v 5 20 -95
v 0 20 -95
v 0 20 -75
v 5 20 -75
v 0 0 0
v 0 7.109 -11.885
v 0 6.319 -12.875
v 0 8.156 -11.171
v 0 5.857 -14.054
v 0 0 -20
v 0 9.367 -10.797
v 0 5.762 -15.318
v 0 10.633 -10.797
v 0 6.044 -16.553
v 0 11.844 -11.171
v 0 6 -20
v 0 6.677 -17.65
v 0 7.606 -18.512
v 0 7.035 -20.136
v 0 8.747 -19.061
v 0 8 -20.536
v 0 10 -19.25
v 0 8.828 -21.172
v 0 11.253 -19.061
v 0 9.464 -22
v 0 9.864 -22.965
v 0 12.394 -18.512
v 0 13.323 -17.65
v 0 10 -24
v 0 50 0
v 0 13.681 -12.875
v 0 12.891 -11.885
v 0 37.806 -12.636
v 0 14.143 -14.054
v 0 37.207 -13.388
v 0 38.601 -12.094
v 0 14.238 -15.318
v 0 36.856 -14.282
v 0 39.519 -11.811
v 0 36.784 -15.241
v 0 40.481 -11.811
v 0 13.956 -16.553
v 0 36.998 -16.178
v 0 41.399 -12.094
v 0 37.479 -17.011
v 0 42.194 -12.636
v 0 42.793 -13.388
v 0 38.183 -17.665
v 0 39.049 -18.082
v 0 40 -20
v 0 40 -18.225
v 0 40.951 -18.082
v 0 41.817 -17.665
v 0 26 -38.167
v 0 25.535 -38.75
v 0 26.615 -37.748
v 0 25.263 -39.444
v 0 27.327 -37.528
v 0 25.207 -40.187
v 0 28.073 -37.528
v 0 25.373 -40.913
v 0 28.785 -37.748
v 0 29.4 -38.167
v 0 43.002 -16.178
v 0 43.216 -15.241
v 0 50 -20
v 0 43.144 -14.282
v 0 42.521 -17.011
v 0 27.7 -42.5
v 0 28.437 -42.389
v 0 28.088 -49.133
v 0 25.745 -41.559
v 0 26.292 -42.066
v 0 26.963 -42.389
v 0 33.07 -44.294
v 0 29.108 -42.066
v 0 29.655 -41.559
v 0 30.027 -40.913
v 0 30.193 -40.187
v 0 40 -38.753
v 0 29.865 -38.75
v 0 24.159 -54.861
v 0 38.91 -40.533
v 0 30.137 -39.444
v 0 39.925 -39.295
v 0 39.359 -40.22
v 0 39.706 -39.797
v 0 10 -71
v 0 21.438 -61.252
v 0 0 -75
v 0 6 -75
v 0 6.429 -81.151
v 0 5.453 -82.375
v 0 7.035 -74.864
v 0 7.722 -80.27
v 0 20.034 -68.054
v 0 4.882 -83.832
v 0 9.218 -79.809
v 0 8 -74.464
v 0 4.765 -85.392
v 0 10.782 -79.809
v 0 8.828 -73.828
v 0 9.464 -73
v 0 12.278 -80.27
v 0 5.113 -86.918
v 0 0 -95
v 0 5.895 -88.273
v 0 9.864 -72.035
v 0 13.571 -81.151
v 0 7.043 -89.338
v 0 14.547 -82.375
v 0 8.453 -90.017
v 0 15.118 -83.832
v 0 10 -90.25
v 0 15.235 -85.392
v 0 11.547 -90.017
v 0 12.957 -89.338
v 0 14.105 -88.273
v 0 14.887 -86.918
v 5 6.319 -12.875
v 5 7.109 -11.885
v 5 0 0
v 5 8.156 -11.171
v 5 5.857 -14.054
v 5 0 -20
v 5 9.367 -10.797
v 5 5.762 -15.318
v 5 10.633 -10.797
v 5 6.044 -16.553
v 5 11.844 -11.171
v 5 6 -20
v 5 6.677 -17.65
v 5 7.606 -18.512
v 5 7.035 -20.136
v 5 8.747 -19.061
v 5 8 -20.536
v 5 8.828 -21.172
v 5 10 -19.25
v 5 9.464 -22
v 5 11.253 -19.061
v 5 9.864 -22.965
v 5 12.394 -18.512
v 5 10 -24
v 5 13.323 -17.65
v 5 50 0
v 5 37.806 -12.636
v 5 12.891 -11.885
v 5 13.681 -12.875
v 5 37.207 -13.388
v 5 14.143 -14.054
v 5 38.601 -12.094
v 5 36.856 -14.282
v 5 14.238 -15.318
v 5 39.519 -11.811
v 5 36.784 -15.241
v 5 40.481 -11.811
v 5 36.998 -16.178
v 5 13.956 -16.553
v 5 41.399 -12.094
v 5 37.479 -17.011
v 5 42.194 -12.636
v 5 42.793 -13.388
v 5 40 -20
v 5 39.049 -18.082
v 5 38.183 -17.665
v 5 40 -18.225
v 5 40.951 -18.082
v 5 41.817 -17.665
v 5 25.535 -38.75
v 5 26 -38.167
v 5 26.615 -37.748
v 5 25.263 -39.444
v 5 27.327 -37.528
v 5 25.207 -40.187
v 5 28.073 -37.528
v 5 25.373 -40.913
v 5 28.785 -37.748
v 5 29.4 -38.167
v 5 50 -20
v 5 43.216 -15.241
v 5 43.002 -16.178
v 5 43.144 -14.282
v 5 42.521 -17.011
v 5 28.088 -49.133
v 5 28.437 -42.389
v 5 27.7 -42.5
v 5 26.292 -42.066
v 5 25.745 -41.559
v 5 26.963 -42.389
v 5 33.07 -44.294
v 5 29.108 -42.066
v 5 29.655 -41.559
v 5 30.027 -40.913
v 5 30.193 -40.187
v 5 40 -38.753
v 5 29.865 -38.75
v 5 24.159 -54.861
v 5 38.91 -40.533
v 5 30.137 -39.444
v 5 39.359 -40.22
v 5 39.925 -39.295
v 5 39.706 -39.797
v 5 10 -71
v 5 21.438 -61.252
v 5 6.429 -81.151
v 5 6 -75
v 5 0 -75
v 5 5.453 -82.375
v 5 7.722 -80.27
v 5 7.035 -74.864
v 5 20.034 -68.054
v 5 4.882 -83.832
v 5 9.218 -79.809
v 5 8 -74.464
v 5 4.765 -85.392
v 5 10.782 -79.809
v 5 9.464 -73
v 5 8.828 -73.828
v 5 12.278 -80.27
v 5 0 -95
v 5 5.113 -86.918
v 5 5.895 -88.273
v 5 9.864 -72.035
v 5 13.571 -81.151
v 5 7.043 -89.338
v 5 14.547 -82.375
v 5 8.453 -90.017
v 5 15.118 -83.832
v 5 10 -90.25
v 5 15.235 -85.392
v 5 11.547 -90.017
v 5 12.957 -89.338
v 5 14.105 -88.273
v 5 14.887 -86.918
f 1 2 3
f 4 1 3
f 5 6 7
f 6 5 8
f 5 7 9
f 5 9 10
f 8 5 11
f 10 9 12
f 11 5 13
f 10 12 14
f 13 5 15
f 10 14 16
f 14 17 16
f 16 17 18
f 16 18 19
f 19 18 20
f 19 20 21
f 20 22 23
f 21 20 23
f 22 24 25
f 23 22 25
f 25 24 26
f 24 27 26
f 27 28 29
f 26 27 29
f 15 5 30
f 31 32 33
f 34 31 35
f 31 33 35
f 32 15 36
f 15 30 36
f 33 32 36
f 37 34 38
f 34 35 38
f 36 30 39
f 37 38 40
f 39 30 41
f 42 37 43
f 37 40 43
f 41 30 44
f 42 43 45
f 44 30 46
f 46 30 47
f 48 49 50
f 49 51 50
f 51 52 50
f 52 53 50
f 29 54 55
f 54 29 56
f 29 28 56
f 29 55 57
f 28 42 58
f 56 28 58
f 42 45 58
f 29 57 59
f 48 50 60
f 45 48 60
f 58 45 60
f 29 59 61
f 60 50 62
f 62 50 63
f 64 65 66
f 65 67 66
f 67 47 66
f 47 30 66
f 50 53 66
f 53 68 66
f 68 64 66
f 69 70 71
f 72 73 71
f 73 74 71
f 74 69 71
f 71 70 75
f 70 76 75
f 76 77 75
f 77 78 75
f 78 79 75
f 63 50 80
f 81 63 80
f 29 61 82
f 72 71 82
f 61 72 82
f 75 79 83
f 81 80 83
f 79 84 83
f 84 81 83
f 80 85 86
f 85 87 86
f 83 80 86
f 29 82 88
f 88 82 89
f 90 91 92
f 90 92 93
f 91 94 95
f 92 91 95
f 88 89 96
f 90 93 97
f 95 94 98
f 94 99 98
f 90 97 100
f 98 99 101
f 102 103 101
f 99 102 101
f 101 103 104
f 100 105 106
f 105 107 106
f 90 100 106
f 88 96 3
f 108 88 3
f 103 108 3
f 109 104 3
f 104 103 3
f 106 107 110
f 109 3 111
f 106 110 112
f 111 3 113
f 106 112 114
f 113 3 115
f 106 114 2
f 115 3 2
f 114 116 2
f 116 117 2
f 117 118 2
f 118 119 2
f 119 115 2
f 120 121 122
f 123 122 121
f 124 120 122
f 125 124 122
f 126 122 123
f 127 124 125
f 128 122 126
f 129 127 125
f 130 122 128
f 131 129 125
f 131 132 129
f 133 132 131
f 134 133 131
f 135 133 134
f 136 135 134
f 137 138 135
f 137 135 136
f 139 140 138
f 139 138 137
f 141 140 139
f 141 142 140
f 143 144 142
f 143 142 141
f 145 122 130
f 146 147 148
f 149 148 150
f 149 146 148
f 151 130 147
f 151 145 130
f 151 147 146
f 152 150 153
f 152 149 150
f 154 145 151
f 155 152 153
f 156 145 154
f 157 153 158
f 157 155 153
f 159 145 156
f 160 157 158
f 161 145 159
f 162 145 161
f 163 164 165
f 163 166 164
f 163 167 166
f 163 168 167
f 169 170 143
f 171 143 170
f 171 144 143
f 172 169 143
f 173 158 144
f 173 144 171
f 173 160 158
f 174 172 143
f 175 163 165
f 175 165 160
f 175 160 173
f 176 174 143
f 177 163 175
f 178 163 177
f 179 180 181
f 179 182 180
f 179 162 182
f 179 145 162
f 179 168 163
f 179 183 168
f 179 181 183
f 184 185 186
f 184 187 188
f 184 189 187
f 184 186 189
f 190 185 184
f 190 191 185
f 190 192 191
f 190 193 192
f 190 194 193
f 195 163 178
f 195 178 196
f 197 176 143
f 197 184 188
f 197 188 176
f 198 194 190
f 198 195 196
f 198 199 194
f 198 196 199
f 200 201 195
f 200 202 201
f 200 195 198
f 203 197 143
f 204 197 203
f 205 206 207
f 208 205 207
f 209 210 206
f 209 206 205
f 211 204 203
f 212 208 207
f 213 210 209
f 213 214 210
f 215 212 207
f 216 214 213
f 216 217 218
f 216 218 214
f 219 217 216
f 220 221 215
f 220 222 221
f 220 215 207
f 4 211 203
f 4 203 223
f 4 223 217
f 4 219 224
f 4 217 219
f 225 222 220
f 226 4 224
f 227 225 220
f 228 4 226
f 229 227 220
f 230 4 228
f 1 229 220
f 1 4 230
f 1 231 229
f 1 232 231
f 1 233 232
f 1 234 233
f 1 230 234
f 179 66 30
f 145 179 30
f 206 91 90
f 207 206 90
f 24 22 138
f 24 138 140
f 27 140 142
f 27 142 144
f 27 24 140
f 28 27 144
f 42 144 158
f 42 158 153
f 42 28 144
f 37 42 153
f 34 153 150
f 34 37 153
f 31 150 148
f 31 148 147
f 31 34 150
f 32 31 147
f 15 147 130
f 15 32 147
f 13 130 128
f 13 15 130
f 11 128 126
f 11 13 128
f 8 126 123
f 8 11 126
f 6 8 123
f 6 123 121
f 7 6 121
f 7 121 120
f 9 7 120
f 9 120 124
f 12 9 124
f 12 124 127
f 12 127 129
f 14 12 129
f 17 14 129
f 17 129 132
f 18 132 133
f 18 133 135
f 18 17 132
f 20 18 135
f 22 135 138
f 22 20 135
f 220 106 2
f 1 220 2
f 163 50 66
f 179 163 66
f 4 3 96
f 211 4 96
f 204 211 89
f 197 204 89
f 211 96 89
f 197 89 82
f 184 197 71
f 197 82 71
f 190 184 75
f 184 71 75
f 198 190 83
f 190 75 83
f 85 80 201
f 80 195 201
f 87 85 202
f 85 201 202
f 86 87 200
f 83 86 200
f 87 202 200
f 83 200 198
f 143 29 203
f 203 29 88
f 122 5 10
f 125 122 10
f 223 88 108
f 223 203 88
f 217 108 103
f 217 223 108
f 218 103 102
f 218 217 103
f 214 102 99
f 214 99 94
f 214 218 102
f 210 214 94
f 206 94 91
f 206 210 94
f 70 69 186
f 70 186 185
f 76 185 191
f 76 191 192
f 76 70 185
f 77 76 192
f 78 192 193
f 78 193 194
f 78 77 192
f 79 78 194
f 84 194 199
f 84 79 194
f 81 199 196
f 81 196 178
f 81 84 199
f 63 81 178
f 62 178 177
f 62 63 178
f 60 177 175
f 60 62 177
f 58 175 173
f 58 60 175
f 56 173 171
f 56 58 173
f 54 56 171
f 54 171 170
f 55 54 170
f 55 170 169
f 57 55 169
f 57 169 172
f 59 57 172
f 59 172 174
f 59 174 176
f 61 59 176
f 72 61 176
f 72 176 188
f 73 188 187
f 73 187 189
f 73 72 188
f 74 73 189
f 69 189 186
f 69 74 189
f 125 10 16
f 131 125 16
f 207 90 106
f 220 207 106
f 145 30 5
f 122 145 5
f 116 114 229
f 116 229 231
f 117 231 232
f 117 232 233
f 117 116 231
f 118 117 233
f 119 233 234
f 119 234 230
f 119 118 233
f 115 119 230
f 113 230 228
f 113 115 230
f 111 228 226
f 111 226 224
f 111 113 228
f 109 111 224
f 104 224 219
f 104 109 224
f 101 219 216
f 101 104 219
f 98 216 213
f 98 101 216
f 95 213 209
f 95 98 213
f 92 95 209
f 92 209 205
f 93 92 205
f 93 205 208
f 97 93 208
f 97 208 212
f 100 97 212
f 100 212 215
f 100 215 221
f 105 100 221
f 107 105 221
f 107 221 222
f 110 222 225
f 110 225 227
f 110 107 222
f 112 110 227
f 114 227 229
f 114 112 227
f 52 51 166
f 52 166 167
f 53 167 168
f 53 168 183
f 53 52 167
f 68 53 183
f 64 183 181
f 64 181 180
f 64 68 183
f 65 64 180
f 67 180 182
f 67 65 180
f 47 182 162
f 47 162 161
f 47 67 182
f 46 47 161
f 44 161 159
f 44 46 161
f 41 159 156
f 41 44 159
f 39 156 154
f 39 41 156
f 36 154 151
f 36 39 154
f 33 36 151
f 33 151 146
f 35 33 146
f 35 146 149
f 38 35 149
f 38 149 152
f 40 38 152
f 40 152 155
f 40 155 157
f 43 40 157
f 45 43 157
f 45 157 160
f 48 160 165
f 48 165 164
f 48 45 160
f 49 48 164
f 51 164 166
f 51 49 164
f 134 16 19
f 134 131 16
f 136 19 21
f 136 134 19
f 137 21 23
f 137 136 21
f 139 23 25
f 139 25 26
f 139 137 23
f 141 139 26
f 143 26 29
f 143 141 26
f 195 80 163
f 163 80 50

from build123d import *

# Parameters (mm, degrees)
SKETCH7_R           = 3.225
SKETCH7_R_2         = 4.25
SKETCH7_R_3         = 2.5
SKETCH7_R_4         = 5.25
BOSS_EXTRUDE5_DEPTH = 5
FILLET1_R           = 4
FILLET2_R           = 2


with BuildPart() as part:
    # Sketch7 → Boss-Extrude5 (new body)
    with BuildSketch(Plane(origin=(0, 0, 0), x_dir=(0, 0, -1), z_dir=(1, 0, 0))):
        with BuildLine():
            Line((0, 0), (20, 0))
            Line((20, 0), (20, 10))
            Line((20, 10), (75, 10))
            Line((75, 10), (75, 0))
            Line((75, 0), (95, 0))
            Line((95, 0), (95, 20))
            Line((95, 20), (75, 20))
            ThreePointArc((75, 20), (54.331561409, 24.455232466), (40, 40))
            Line((40, 40), (20, 40))
            Line((20, 40), (20, 50))
            Line((20, 50), (0, 50))
            Line((0, 50), (0, 0))
        make_face()
        with Locations((15, 40)):
            Circle(SKETCH7_R, mode=Mode.SUBTRACT)
        with Locations((15, 10)):
            Circle(SKETCH7_R_2, mode=Mode.SUBTRACT)
        with Locations((40, 27.700051953)):
            Circle(SKETCH7_R_3, mode=Mode.SUBTRACT)
        with Locations((85, 10)):
            Circle(SKETCH7_R_4, mode=Mode.SUBTRACT)
    extrude(amount=BOSS_EXTRUDE5_DEPTH)

    # Fillet1
    fillet1_edges = [part.edges().sort_by_distance(p)[0] for p in [
        (2.5, 10, -75),
        (2.5, 10, -20),
    ]]
    fillet(fillet1_edges, radius=FILLET1_R)

    # Fillet2
    fillet2_edges = [part.edges().sort_by_distance(p)[0] for p in [
        (2.5, 40, -40),
    ]]
    fillet(fillet2_edges, radius=FILLET2_R)


solid = part.part
